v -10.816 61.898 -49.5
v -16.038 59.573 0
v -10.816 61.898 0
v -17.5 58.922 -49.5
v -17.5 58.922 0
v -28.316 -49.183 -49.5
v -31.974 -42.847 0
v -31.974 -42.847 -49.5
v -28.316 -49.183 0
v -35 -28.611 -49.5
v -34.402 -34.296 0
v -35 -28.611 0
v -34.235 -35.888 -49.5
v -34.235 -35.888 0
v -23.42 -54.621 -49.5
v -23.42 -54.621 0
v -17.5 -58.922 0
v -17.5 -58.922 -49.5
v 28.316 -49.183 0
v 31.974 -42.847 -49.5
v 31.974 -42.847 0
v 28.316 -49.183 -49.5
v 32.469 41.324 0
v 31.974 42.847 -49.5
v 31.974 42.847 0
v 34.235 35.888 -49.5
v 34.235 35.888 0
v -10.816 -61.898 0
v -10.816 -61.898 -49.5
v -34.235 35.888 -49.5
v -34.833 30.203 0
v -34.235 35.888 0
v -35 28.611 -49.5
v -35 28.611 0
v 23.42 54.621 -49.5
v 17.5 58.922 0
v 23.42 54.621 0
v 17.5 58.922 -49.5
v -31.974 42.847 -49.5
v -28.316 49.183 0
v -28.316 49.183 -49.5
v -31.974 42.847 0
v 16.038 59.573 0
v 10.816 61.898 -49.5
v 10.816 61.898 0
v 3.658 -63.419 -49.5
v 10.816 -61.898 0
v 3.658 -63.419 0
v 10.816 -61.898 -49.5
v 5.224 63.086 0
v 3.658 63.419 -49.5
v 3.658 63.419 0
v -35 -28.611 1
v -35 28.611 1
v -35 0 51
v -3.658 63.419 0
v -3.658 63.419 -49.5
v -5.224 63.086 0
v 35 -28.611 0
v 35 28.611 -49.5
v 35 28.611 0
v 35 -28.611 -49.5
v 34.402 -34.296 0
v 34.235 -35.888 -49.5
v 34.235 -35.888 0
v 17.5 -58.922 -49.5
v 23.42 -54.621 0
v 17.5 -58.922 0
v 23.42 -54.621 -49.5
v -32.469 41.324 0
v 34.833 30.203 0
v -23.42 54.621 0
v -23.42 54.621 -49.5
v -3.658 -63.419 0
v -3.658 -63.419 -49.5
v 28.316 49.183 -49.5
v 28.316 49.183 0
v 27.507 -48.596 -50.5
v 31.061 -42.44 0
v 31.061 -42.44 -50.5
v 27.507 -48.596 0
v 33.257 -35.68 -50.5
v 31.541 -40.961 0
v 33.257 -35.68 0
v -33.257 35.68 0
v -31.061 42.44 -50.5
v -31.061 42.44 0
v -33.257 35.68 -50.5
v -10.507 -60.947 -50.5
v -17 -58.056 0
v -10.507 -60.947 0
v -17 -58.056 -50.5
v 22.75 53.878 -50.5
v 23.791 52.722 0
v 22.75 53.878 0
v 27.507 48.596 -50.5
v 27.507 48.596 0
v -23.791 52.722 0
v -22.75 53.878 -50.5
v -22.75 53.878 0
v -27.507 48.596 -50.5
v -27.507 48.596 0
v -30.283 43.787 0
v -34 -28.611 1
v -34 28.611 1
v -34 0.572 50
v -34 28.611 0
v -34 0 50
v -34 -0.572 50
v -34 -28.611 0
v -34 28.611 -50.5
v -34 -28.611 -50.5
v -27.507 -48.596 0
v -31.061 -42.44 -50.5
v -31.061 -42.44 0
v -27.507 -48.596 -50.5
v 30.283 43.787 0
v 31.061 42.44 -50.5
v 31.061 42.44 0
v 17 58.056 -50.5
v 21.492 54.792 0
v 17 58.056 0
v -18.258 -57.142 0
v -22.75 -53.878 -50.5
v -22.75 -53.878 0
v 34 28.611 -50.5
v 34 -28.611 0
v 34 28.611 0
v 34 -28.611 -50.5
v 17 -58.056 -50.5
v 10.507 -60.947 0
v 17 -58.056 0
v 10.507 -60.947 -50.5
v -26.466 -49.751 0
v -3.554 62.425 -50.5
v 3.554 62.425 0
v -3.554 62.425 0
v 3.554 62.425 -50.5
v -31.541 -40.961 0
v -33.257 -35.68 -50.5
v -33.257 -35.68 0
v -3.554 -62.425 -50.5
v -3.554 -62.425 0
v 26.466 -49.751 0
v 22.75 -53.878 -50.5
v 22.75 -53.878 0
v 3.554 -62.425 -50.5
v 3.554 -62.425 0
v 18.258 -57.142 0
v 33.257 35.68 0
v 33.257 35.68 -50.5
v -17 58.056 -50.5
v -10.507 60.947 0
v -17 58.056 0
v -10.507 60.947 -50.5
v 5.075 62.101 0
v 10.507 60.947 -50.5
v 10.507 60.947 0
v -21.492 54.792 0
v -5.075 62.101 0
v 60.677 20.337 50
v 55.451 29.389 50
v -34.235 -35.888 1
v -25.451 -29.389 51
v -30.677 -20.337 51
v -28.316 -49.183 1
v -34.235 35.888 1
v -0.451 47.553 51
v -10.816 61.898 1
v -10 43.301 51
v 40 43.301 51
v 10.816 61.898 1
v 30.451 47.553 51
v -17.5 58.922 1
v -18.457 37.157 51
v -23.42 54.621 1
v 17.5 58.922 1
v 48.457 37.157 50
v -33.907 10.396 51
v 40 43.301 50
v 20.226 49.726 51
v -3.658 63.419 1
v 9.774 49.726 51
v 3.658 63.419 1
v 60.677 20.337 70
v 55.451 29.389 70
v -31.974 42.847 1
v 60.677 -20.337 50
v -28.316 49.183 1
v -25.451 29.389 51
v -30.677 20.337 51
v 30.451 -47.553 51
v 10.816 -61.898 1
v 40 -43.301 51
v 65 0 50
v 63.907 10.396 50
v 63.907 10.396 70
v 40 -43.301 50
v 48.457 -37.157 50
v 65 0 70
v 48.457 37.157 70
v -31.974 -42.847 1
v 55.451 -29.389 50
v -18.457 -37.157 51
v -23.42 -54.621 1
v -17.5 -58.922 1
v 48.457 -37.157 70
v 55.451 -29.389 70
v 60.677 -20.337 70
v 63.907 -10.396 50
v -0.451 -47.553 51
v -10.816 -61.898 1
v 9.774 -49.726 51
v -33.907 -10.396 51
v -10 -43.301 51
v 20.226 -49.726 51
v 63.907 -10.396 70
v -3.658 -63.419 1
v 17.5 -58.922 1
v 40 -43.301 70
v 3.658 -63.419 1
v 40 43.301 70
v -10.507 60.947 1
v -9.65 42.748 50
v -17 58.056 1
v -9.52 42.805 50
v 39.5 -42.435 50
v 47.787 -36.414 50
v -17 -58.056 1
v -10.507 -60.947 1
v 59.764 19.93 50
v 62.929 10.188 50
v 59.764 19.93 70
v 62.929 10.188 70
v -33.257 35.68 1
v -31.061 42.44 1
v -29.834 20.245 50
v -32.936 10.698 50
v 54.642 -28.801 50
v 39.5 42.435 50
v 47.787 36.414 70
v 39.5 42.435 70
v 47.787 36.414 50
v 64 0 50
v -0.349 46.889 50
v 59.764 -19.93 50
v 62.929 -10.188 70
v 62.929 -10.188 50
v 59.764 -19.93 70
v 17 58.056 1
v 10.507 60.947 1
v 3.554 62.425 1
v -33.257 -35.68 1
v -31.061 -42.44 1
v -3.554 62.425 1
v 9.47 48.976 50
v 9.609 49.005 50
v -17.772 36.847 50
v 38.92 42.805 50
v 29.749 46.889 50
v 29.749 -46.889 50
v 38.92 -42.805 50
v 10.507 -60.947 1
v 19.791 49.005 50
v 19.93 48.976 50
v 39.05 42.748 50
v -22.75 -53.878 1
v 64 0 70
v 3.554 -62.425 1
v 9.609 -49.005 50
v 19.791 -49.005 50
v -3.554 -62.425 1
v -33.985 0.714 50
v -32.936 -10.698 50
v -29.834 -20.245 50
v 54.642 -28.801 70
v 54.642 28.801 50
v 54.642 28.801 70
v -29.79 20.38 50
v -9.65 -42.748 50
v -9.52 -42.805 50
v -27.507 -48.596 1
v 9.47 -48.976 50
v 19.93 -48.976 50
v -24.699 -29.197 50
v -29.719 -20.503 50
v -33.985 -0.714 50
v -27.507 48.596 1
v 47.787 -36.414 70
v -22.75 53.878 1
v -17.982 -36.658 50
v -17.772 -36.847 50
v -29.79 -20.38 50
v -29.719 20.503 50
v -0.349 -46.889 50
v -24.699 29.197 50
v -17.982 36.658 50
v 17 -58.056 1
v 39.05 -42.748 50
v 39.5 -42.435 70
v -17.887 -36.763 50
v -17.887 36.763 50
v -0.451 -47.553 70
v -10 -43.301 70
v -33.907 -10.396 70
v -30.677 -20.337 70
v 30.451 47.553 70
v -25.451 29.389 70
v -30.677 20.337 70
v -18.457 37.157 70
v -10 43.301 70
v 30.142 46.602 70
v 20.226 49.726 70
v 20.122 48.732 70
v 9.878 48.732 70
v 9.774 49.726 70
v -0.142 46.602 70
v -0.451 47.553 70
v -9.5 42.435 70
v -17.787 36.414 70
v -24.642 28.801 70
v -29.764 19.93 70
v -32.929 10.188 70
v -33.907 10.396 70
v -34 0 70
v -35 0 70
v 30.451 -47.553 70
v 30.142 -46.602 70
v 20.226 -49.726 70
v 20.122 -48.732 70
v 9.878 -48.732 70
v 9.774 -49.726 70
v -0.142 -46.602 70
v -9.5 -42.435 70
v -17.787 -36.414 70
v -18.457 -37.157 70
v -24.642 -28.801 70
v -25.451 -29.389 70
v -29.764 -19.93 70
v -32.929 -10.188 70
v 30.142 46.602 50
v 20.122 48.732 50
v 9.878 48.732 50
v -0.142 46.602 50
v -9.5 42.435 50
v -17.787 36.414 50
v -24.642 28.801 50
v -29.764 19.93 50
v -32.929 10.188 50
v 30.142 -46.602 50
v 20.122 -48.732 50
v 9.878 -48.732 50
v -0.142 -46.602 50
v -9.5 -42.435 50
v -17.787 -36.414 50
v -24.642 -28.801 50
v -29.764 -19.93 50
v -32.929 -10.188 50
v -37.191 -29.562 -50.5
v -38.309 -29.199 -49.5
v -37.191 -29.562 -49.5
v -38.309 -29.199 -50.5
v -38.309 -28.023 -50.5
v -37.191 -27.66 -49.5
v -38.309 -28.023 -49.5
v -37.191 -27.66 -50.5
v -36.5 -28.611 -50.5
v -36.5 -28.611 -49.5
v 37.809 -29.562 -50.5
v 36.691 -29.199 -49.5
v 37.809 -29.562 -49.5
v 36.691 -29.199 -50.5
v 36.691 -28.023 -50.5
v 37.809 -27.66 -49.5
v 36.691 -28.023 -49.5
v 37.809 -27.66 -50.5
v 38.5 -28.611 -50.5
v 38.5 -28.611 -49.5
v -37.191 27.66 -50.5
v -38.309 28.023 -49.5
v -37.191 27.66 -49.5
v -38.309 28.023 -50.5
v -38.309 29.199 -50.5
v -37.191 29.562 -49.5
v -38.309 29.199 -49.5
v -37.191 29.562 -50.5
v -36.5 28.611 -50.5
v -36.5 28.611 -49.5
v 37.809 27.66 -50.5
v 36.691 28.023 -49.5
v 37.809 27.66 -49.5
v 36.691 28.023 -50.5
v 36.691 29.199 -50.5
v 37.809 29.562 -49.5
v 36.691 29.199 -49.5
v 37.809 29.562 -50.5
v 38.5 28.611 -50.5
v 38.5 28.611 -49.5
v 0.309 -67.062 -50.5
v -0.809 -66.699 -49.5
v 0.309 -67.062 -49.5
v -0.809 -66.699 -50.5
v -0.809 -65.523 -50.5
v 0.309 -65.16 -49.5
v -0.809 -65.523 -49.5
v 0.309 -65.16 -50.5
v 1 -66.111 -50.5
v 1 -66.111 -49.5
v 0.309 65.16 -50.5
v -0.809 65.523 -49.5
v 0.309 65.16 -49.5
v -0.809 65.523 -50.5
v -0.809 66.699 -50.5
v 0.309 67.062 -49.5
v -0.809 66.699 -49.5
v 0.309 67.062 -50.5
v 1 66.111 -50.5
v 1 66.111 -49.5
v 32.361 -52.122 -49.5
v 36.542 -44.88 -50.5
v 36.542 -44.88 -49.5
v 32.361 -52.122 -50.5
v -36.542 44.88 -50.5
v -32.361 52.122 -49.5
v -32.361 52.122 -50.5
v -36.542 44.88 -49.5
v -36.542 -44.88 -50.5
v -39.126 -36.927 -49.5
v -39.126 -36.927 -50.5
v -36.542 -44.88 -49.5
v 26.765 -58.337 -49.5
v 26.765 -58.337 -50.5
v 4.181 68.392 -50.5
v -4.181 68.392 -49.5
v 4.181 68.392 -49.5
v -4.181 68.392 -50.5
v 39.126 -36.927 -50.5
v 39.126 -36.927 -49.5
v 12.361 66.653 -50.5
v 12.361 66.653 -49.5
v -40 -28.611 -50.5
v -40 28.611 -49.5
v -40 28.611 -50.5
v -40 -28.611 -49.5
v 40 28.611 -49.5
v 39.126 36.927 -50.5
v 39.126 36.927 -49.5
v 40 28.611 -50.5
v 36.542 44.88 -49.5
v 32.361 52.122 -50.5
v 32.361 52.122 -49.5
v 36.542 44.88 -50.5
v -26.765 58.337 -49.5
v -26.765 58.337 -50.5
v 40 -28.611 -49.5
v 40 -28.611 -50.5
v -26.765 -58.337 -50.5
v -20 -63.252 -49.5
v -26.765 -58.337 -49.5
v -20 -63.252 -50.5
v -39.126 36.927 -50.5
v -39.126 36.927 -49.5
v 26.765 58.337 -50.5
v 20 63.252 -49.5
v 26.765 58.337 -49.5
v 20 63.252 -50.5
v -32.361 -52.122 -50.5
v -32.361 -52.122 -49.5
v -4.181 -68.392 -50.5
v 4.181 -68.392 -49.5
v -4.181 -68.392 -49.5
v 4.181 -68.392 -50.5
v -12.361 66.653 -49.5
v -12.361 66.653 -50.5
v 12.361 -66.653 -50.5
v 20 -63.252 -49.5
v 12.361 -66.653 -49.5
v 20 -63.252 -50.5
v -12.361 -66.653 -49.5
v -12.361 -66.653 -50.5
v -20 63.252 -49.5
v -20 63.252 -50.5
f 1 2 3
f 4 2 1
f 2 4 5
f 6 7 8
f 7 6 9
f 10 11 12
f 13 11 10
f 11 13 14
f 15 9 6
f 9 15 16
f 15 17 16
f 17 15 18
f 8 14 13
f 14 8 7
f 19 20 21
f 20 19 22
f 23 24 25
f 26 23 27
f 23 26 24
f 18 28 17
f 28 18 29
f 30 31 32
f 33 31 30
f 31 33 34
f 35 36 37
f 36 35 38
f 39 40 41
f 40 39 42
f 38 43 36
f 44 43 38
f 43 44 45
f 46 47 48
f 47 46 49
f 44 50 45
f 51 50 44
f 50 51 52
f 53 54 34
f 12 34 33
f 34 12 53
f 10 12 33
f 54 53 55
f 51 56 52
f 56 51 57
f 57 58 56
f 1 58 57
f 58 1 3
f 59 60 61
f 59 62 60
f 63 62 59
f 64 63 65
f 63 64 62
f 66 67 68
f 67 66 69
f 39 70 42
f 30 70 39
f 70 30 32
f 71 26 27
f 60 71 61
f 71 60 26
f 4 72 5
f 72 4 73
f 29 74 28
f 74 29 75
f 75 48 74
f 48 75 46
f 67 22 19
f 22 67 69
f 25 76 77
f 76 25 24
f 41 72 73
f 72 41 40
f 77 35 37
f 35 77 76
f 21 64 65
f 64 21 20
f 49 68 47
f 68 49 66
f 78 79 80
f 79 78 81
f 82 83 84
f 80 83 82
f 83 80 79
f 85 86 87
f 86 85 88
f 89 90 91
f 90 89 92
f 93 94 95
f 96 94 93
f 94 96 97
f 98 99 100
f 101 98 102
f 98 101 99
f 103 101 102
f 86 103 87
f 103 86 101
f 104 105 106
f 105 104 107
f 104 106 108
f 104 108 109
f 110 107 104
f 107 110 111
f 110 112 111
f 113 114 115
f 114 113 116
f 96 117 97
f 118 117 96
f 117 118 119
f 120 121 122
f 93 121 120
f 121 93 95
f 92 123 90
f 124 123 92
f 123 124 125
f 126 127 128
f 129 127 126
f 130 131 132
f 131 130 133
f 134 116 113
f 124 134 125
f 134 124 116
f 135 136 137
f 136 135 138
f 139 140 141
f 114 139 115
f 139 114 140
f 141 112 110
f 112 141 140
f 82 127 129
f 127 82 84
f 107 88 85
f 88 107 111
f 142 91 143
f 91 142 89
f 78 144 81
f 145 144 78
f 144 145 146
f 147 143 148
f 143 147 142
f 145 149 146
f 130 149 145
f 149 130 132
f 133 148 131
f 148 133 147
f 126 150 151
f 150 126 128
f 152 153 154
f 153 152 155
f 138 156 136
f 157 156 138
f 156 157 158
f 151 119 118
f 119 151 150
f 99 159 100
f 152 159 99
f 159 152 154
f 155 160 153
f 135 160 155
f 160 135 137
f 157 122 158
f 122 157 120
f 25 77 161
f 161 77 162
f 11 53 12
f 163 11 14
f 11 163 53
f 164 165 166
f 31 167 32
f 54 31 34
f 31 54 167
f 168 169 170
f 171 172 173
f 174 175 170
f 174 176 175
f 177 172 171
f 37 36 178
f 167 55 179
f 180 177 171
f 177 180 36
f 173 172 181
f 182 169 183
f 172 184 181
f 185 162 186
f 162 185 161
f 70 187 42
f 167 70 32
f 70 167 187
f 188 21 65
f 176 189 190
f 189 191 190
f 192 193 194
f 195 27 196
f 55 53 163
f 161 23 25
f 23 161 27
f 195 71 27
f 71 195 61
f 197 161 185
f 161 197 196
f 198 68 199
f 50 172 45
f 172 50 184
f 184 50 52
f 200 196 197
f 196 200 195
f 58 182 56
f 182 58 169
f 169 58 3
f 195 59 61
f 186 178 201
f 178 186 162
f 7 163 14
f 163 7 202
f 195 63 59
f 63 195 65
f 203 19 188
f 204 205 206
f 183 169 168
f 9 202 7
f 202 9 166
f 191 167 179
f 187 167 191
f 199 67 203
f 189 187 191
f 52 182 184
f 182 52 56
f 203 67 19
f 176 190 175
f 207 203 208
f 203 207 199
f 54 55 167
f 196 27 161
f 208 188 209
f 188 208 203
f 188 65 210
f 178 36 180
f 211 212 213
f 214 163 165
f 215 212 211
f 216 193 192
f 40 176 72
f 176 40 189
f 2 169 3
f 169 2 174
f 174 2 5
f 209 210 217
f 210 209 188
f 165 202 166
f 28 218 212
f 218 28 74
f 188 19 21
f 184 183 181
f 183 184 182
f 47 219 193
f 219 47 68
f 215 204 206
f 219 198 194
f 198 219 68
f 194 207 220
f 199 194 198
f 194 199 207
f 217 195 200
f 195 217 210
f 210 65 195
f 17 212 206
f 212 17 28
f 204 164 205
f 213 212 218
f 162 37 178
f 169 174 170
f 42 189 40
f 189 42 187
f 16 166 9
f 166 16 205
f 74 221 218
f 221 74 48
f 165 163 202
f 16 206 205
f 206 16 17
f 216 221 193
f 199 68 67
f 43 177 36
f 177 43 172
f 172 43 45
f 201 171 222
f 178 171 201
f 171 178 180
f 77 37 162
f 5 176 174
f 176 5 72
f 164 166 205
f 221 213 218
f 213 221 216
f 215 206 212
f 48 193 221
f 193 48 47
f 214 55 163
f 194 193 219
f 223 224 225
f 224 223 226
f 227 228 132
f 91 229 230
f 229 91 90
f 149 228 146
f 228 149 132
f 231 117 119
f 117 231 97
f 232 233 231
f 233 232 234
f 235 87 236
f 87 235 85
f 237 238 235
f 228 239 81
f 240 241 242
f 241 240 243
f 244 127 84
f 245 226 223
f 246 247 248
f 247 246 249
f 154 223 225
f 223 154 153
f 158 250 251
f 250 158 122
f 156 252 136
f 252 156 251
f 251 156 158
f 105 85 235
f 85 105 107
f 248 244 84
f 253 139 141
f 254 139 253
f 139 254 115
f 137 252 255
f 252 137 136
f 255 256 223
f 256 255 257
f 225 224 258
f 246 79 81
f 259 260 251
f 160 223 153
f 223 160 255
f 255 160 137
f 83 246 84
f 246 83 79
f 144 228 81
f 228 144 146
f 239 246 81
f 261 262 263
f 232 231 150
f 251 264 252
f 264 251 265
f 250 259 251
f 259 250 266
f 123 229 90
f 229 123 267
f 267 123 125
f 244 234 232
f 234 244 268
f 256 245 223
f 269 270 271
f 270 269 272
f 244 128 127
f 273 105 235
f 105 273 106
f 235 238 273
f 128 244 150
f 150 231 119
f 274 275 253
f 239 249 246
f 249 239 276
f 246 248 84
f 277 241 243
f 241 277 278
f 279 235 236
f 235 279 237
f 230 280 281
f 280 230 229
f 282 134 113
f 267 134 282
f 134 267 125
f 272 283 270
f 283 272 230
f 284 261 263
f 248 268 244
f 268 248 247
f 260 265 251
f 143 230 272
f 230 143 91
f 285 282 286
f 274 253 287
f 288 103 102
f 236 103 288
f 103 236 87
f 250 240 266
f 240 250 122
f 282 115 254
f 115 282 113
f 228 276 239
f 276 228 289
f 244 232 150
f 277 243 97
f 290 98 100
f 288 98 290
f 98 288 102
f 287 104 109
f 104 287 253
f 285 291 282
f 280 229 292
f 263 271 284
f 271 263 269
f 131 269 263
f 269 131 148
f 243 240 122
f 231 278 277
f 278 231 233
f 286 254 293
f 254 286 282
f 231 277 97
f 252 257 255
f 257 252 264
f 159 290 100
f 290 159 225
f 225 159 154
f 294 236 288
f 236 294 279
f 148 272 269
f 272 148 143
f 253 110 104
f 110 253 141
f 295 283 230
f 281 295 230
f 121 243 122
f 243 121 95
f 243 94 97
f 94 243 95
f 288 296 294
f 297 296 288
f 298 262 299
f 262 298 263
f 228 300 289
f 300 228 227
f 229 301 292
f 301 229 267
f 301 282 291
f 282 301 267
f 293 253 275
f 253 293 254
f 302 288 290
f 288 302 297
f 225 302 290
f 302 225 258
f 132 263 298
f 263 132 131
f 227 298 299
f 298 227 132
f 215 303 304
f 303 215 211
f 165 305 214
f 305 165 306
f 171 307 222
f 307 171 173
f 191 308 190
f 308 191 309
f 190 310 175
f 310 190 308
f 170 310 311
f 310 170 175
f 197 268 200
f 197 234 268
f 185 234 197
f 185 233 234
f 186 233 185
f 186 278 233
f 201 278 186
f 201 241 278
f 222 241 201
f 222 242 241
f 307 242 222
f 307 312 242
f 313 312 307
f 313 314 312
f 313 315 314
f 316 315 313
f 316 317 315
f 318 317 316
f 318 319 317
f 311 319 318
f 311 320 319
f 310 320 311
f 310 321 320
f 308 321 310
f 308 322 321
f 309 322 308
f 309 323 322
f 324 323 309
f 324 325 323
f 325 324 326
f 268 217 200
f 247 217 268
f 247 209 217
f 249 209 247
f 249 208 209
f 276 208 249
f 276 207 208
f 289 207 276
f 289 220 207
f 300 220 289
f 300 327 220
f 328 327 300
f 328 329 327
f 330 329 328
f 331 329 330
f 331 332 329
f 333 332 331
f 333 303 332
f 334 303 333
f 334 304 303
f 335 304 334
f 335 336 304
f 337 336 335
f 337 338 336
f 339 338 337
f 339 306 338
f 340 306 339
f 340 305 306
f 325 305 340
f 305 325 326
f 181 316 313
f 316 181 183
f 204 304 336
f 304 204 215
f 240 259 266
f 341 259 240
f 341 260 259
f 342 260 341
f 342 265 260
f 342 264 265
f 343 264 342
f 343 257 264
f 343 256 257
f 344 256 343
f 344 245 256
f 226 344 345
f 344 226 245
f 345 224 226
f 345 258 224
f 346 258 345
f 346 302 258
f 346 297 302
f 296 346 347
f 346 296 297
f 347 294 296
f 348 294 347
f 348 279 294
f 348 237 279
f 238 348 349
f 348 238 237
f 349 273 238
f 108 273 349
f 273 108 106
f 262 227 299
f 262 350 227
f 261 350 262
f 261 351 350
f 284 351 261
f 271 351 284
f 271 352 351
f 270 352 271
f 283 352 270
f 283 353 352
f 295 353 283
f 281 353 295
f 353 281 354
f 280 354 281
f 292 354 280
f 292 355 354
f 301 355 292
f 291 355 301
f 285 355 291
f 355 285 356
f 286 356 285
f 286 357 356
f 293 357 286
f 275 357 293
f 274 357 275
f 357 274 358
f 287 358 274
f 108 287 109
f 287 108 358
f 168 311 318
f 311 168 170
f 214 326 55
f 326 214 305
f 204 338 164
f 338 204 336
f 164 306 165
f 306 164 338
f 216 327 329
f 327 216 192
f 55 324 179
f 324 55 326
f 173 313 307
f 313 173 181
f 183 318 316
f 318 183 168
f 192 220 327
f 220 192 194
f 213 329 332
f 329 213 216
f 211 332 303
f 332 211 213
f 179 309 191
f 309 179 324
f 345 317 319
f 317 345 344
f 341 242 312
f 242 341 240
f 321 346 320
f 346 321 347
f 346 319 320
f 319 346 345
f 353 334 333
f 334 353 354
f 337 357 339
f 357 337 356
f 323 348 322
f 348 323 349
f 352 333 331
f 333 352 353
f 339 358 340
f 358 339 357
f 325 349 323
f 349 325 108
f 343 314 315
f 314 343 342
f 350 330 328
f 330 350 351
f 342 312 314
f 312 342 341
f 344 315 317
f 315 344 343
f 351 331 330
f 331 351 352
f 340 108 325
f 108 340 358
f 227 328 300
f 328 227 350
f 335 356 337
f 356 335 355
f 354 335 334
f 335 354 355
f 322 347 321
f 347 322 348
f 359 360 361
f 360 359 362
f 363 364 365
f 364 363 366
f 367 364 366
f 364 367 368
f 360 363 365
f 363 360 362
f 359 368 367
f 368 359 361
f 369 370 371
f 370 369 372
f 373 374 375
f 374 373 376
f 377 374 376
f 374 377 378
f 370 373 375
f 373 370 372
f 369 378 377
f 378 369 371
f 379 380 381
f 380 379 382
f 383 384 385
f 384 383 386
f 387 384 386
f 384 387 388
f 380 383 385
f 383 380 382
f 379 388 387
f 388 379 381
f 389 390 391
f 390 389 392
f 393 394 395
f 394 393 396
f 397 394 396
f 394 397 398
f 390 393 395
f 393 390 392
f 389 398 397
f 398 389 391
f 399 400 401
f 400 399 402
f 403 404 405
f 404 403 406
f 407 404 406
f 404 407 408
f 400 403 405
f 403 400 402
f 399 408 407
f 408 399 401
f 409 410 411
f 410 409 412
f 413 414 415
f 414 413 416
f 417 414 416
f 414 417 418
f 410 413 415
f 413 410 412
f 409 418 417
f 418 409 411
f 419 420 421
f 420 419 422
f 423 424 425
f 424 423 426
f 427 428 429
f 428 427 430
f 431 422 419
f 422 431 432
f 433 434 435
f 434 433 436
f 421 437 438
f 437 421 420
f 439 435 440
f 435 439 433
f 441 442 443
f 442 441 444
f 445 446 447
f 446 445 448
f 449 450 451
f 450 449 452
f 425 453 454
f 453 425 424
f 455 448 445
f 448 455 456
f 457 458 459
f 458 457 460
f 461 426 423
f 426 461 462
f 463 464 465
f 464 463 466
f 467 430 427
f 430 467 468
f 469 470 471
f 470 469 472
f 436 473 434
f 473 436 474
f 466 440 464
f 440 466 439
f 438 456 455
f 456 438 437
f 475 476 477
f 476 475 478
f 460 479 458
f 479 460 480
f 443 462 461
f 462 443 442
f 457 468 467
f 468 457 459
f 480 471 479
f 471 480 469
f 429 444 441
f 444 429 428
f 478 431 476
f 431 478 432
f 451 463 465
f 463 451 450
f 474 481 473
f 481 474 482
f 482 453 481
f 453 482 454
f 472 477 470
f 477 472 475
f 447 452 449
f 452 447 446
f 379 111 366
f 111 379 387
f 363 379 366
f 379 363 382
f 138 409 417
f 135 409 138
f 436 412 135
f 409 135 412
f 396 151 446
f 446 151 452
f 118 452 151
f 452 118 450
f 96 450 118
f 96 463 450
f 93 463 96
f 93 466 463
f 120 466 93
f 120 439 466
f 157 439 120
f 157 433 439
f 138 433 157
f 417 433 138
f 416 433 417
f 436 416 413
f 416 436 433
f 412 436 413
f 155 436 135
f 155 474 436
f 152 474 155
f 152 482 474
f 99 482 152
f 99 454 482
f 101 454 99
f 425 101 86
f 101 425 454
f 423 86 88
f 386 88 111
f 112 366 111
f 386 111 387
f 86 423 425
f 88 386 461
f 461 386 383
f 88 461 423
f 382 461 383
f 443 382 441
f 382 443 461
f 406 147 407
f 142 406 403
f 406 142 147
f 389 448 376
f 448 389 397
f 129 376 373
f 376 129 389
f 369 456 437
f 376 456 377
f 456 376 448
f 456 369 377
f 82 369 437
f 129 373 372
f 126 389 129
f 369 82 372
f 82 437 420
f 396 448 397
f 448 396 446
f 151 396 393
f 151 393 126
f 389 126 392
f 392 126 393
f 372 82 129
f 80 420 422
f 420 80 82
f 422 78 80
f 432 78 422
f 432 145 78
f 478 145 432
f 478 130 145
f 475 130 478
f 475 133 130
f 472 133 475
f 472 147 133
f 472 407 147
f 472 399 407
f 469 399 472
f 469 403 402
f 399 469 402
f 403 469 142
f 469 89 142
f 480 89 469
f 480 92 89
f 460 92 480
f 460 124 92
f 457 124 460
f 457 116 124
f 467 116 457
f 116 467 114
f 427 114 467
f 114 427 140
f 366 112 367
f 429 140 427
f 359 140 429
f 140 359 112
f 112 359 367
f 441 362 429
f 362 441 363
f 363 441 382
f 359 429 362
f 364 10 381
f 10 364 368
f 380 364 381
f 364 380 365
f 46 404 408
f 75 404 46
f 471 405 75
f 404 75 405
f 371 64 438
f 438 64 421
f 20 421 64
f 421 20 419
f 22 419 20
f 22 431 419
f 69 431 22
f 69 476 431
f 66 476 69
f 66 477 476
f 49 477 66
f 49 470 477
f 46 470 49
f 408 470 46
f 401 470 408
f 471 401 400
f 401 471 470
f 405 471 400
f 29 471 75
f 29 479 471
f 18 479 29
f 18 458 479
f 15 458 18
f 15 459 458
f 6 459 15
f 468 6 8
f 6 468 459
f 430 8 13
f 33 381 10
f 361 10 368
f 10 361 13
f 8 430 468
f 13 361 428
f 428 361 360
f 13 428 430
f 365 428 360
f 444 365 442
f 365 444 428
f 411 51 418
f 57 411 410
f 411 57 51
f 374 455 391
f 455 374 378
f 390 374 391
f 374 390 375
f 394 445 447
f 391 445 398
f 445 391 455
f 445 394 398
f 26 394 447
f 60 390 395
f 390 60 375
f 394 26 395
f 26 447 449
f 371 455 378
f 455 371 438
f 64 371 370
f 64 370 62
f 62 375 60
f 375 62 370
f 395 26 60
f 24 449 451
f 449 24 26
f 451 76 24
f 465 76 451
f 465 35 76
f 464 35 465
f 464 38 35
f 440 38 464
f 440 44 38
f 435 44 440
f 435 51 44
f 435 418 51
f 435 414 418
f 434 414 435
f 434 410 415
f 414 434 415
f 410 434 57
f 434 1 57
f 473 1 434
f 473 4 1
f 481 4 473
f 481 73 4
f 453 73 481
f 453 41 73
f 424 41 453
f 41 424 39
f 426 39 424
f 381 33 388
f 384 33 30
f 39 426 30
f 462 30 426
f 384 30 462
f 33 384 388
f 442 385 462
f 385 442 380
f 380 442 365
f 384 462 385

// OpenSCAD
//how wide you want window to be open i.e the width of your bit of wood
windowOpeningDistance=80; 
//at what depth can we start transitioning into pipe connection
openingDepth=50; //min/max: [10:100]
//thickness of walls
t=1;	
//umm the diameter of your pipe...
pipeDiameter=100;
//offest of pipe opening based on window opening
pipeOffset=15;	//min/max: [0:100]
//how long to take to change from pipe to window slot shape
taperLength=50;	//min/max: [10:100]	
//length that pipe attches to
pipeConnectLength=20;	
//set this to be a bit bigger than the diameter of the head of your screws
lip=5;
//diameter of holes for screws
screwHoleDia=2;

z=openingDepth; 
x=windowOpeningDistance-(2*lip);
y=(PI/4)*((pow(pipeDiameter,2)/x)-x); //height it must be based on x to = surface area of pipe opening i.e no air flow restriction

union(){
translate([0,-y/2,-z/2])
difference(){
	hull(){
		cylinder(r=x/2, h=z, center=true);
		translate([0,y,0]) cylinder(r=x/2, h=z, center=true);
	}
	
	hull(){
		cylinder(r=x/2-t, h=z+t, center=true);
		translate([0,y,0]) cylinder(r=x/2-t, h=z, center=true);
	}
}

translate([0,0,t/2])
difference(){
	hull(){
		translate([0,-y/2,0])
		hull(){
			cylinder(r=x/2, h=t, center=true);
			translate([0,y,0]) cylinder(r=x/2, h=t, center=true);
		}
		translate([pipeOffset,0,taperLength])
		cylinder(r=pipeDiameter/2,h=t,center=true);
	}
	hull(){
		translate([0,-y/2,])
		hull(){
			cylinder(r=x/2-t, h=t, center=true);
			translate([0,y,0]) cylinder(r=x/2-t, h=t, center=true);
		}
		translate([pipeOffset,0,taperLength])
		cylinder(r=pipeDiameter/2-t,h=t,center=true);
	}
}

translate([pipeOffset,0,taperLength])
difference(){
cylinder(r=pipeDiameter/2,h=pipeConnectLength);
cylinder(r=pipeDiameter/2-t,h=pipeConnectLength);
}

translate([0,-y/2,-z])
difference(){
	hull(){
		cylinder(r=x/2+lip, h=t, center=true);
		translate([0,y,0]) cylinder(r=x/2+lip, h=t, center=true);
	}
	
	hull(){
		cylinder(r=x/2-t, h=t, center=true);
		translate([0,y,0]) cylinder(r=x/2-t, h=t, center=true);
	}

    for(j=[0:1]){
        for(i=[-1,1]){
            translate([x*i/2+lip*i/2,y*j,0])
            cylinder(d=screwHoleDia,h=2*t,center=true);
            

        }
        translate([0,y*j+x*(2*j-1)/2+lip*(2*j-1)/2,0])
        cylinder(d=screwHoleDia,h=2*t,center=true);
    }

}

}
